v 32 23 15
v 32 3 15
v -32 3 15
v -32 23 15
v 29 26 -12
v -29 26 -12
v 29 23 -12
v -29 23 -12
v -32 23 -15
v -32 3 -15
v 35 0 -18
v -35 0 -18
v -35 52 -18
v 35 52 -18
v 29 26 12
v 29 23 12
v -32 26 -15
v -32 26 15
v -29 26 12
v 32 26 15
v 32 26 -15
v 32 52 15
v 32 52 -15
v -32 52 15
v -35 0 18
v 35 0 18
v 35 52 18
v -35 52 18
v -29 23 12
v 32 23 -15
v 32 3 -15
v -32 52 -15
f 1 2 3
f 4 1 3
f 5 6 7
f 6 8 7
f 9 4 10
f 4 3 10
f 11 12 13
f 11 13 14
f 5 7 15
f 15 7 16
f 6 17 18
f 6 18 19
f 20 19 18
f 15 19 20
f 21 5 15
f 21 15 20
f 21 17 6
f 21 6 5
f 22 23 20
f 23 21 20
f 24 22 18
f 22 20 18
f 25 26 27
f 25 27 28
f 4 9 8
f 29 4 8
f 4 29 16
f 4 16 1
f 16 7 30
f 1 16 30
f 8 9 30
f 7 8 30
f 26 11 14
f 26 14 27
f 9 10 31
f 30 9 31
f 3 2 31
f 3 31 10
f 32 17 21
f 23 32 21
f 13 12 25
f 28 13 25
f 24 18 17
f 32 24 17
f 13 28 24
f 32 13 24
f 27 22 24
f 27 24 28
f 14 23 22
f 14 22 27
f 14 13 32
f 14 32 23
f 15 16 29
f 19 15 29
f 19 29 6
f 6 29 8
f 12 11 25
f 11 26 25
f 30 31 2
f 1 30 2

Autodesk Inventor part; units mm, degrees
ref_plane "YZ Plane" through (0, 0, 0) normal (1, 0, 0) x (0, 1, 0)
ref_plane "XZ Plane" through (0, 0, 0) normal (0, 1, 0) x (-1, 0, 0)
ref_plane "XY Plane" through (0, 0, 0) normal (0, 0, 1) x (1, 0, 0)
sketch "Boceto1" plane through (0, 0, 0) normal (0, 1, 0) x (-1, 0, 0)
  line L0 (-35, 18) -> (35, 18)
  line L1 (35, 18) -> (35, -18)
  line L2 (35, -18) -> (-35, -18)
  line L3 (-35, -18) -> (-35, 18)
  line L4 (-35, 18) -> (35, -18) construction
  line L5 (35, 18) -> (-35, -18) construction
  line L6 (-32, 15) -> (32, 15)
  line L7 (32, 15) -> (32, -15)
  line L8 (32, -15) -> (-32, -15)
  line L9 (-32, -15) -> (-32, 15)
  line L10 (-32, 15) -> (32, -15) construction
  line L11 (32, 15) -> (-32, -15) construction
  point P0 (0, 0)
  dimension "d0" = 70
  dimension "d1" = 36
  dimension "d2" = 3
  dimension "d3" = 3
extrude "Extrusión1" add sketch "Boceto1" along normal blind 3 contours L6 L7 L8 L9
extrude "Extrusión2" add sketch "Boceto1" along normal blind 23
sketch "Boceto2" plane through (0, 23, 0) normal (0, 1, 0) x (1, 0, 0)
  line L0 (35, 18) -> (-35, 18) projected
  line L1 (35, -18) -> (-35, -18)
  line L2 (-35, -18) -> (-35, 18)
  line L3 (-35, 18) -> (35, 18)
  line L4 (35, 18) -> (35, -18)
  line L5 (35, -18) -> (-35, 18) construction
  line L6 (-35, -18) -> (35, 18) construction
  line L7 (29, -12) -> (-29, -12)
  line L8 (-29, -12) -> (-29, 12)
  line L9 (-29, 12) -> (29, 12)
  line L10 (29, 12) -> (29, -12)
  line L11 (29, -12) -> (-29, 12) construction
  line L12 (-29, -12) -> (29, 12) construction
  point P0 (0, 0)
  dimension "d8" = 6
  dimension "d9" = 6
extrude "Extrusión3" add sketch "Boceto2" along normal blind 3
sketch "Boceto3" plane through (0, 26, 0) normal (0, 1, 0) x (1, 0, 0)
  point P0 (0, 0)
sketch "Boceto4" plane through (0, 26, 0) normal (0, 1, 0) x (1, 0, 0)
  line L0 (-35, 18) -> (-35, -18) projected
  line L1 (35, -18) -> (-35, -18)
  line L2 (-35, -18) -> (-35, 18)
  line L3 (-35, 18) -> (35, 18)
  line L4 (35, 18) -> (35, -18)
  line L5 (35, -18) -> (-35, 18) construction
  line L6 (-35, -18) -> (35, 18) construction
  line L7 (32, -15) -> (-32, -15)
  line L8 (-32, -15) -> (-32, 15)
  line L9 (-32, 15) -> (32, 15)
  line L10 (32, 15) -> (32, -15)
  line L11 (32, -15) -> (-32, 15) construction
  line L12 (-32, -15) -> (32, 15) construction
  point P0 (0, 0)
  dimension "d21" = 3
  dimension "d22" = 3
extrude "Extrusión4" add sketch "Boceto4" along normal blind 26
properties part number "Capsula" material "Plástico PET"
